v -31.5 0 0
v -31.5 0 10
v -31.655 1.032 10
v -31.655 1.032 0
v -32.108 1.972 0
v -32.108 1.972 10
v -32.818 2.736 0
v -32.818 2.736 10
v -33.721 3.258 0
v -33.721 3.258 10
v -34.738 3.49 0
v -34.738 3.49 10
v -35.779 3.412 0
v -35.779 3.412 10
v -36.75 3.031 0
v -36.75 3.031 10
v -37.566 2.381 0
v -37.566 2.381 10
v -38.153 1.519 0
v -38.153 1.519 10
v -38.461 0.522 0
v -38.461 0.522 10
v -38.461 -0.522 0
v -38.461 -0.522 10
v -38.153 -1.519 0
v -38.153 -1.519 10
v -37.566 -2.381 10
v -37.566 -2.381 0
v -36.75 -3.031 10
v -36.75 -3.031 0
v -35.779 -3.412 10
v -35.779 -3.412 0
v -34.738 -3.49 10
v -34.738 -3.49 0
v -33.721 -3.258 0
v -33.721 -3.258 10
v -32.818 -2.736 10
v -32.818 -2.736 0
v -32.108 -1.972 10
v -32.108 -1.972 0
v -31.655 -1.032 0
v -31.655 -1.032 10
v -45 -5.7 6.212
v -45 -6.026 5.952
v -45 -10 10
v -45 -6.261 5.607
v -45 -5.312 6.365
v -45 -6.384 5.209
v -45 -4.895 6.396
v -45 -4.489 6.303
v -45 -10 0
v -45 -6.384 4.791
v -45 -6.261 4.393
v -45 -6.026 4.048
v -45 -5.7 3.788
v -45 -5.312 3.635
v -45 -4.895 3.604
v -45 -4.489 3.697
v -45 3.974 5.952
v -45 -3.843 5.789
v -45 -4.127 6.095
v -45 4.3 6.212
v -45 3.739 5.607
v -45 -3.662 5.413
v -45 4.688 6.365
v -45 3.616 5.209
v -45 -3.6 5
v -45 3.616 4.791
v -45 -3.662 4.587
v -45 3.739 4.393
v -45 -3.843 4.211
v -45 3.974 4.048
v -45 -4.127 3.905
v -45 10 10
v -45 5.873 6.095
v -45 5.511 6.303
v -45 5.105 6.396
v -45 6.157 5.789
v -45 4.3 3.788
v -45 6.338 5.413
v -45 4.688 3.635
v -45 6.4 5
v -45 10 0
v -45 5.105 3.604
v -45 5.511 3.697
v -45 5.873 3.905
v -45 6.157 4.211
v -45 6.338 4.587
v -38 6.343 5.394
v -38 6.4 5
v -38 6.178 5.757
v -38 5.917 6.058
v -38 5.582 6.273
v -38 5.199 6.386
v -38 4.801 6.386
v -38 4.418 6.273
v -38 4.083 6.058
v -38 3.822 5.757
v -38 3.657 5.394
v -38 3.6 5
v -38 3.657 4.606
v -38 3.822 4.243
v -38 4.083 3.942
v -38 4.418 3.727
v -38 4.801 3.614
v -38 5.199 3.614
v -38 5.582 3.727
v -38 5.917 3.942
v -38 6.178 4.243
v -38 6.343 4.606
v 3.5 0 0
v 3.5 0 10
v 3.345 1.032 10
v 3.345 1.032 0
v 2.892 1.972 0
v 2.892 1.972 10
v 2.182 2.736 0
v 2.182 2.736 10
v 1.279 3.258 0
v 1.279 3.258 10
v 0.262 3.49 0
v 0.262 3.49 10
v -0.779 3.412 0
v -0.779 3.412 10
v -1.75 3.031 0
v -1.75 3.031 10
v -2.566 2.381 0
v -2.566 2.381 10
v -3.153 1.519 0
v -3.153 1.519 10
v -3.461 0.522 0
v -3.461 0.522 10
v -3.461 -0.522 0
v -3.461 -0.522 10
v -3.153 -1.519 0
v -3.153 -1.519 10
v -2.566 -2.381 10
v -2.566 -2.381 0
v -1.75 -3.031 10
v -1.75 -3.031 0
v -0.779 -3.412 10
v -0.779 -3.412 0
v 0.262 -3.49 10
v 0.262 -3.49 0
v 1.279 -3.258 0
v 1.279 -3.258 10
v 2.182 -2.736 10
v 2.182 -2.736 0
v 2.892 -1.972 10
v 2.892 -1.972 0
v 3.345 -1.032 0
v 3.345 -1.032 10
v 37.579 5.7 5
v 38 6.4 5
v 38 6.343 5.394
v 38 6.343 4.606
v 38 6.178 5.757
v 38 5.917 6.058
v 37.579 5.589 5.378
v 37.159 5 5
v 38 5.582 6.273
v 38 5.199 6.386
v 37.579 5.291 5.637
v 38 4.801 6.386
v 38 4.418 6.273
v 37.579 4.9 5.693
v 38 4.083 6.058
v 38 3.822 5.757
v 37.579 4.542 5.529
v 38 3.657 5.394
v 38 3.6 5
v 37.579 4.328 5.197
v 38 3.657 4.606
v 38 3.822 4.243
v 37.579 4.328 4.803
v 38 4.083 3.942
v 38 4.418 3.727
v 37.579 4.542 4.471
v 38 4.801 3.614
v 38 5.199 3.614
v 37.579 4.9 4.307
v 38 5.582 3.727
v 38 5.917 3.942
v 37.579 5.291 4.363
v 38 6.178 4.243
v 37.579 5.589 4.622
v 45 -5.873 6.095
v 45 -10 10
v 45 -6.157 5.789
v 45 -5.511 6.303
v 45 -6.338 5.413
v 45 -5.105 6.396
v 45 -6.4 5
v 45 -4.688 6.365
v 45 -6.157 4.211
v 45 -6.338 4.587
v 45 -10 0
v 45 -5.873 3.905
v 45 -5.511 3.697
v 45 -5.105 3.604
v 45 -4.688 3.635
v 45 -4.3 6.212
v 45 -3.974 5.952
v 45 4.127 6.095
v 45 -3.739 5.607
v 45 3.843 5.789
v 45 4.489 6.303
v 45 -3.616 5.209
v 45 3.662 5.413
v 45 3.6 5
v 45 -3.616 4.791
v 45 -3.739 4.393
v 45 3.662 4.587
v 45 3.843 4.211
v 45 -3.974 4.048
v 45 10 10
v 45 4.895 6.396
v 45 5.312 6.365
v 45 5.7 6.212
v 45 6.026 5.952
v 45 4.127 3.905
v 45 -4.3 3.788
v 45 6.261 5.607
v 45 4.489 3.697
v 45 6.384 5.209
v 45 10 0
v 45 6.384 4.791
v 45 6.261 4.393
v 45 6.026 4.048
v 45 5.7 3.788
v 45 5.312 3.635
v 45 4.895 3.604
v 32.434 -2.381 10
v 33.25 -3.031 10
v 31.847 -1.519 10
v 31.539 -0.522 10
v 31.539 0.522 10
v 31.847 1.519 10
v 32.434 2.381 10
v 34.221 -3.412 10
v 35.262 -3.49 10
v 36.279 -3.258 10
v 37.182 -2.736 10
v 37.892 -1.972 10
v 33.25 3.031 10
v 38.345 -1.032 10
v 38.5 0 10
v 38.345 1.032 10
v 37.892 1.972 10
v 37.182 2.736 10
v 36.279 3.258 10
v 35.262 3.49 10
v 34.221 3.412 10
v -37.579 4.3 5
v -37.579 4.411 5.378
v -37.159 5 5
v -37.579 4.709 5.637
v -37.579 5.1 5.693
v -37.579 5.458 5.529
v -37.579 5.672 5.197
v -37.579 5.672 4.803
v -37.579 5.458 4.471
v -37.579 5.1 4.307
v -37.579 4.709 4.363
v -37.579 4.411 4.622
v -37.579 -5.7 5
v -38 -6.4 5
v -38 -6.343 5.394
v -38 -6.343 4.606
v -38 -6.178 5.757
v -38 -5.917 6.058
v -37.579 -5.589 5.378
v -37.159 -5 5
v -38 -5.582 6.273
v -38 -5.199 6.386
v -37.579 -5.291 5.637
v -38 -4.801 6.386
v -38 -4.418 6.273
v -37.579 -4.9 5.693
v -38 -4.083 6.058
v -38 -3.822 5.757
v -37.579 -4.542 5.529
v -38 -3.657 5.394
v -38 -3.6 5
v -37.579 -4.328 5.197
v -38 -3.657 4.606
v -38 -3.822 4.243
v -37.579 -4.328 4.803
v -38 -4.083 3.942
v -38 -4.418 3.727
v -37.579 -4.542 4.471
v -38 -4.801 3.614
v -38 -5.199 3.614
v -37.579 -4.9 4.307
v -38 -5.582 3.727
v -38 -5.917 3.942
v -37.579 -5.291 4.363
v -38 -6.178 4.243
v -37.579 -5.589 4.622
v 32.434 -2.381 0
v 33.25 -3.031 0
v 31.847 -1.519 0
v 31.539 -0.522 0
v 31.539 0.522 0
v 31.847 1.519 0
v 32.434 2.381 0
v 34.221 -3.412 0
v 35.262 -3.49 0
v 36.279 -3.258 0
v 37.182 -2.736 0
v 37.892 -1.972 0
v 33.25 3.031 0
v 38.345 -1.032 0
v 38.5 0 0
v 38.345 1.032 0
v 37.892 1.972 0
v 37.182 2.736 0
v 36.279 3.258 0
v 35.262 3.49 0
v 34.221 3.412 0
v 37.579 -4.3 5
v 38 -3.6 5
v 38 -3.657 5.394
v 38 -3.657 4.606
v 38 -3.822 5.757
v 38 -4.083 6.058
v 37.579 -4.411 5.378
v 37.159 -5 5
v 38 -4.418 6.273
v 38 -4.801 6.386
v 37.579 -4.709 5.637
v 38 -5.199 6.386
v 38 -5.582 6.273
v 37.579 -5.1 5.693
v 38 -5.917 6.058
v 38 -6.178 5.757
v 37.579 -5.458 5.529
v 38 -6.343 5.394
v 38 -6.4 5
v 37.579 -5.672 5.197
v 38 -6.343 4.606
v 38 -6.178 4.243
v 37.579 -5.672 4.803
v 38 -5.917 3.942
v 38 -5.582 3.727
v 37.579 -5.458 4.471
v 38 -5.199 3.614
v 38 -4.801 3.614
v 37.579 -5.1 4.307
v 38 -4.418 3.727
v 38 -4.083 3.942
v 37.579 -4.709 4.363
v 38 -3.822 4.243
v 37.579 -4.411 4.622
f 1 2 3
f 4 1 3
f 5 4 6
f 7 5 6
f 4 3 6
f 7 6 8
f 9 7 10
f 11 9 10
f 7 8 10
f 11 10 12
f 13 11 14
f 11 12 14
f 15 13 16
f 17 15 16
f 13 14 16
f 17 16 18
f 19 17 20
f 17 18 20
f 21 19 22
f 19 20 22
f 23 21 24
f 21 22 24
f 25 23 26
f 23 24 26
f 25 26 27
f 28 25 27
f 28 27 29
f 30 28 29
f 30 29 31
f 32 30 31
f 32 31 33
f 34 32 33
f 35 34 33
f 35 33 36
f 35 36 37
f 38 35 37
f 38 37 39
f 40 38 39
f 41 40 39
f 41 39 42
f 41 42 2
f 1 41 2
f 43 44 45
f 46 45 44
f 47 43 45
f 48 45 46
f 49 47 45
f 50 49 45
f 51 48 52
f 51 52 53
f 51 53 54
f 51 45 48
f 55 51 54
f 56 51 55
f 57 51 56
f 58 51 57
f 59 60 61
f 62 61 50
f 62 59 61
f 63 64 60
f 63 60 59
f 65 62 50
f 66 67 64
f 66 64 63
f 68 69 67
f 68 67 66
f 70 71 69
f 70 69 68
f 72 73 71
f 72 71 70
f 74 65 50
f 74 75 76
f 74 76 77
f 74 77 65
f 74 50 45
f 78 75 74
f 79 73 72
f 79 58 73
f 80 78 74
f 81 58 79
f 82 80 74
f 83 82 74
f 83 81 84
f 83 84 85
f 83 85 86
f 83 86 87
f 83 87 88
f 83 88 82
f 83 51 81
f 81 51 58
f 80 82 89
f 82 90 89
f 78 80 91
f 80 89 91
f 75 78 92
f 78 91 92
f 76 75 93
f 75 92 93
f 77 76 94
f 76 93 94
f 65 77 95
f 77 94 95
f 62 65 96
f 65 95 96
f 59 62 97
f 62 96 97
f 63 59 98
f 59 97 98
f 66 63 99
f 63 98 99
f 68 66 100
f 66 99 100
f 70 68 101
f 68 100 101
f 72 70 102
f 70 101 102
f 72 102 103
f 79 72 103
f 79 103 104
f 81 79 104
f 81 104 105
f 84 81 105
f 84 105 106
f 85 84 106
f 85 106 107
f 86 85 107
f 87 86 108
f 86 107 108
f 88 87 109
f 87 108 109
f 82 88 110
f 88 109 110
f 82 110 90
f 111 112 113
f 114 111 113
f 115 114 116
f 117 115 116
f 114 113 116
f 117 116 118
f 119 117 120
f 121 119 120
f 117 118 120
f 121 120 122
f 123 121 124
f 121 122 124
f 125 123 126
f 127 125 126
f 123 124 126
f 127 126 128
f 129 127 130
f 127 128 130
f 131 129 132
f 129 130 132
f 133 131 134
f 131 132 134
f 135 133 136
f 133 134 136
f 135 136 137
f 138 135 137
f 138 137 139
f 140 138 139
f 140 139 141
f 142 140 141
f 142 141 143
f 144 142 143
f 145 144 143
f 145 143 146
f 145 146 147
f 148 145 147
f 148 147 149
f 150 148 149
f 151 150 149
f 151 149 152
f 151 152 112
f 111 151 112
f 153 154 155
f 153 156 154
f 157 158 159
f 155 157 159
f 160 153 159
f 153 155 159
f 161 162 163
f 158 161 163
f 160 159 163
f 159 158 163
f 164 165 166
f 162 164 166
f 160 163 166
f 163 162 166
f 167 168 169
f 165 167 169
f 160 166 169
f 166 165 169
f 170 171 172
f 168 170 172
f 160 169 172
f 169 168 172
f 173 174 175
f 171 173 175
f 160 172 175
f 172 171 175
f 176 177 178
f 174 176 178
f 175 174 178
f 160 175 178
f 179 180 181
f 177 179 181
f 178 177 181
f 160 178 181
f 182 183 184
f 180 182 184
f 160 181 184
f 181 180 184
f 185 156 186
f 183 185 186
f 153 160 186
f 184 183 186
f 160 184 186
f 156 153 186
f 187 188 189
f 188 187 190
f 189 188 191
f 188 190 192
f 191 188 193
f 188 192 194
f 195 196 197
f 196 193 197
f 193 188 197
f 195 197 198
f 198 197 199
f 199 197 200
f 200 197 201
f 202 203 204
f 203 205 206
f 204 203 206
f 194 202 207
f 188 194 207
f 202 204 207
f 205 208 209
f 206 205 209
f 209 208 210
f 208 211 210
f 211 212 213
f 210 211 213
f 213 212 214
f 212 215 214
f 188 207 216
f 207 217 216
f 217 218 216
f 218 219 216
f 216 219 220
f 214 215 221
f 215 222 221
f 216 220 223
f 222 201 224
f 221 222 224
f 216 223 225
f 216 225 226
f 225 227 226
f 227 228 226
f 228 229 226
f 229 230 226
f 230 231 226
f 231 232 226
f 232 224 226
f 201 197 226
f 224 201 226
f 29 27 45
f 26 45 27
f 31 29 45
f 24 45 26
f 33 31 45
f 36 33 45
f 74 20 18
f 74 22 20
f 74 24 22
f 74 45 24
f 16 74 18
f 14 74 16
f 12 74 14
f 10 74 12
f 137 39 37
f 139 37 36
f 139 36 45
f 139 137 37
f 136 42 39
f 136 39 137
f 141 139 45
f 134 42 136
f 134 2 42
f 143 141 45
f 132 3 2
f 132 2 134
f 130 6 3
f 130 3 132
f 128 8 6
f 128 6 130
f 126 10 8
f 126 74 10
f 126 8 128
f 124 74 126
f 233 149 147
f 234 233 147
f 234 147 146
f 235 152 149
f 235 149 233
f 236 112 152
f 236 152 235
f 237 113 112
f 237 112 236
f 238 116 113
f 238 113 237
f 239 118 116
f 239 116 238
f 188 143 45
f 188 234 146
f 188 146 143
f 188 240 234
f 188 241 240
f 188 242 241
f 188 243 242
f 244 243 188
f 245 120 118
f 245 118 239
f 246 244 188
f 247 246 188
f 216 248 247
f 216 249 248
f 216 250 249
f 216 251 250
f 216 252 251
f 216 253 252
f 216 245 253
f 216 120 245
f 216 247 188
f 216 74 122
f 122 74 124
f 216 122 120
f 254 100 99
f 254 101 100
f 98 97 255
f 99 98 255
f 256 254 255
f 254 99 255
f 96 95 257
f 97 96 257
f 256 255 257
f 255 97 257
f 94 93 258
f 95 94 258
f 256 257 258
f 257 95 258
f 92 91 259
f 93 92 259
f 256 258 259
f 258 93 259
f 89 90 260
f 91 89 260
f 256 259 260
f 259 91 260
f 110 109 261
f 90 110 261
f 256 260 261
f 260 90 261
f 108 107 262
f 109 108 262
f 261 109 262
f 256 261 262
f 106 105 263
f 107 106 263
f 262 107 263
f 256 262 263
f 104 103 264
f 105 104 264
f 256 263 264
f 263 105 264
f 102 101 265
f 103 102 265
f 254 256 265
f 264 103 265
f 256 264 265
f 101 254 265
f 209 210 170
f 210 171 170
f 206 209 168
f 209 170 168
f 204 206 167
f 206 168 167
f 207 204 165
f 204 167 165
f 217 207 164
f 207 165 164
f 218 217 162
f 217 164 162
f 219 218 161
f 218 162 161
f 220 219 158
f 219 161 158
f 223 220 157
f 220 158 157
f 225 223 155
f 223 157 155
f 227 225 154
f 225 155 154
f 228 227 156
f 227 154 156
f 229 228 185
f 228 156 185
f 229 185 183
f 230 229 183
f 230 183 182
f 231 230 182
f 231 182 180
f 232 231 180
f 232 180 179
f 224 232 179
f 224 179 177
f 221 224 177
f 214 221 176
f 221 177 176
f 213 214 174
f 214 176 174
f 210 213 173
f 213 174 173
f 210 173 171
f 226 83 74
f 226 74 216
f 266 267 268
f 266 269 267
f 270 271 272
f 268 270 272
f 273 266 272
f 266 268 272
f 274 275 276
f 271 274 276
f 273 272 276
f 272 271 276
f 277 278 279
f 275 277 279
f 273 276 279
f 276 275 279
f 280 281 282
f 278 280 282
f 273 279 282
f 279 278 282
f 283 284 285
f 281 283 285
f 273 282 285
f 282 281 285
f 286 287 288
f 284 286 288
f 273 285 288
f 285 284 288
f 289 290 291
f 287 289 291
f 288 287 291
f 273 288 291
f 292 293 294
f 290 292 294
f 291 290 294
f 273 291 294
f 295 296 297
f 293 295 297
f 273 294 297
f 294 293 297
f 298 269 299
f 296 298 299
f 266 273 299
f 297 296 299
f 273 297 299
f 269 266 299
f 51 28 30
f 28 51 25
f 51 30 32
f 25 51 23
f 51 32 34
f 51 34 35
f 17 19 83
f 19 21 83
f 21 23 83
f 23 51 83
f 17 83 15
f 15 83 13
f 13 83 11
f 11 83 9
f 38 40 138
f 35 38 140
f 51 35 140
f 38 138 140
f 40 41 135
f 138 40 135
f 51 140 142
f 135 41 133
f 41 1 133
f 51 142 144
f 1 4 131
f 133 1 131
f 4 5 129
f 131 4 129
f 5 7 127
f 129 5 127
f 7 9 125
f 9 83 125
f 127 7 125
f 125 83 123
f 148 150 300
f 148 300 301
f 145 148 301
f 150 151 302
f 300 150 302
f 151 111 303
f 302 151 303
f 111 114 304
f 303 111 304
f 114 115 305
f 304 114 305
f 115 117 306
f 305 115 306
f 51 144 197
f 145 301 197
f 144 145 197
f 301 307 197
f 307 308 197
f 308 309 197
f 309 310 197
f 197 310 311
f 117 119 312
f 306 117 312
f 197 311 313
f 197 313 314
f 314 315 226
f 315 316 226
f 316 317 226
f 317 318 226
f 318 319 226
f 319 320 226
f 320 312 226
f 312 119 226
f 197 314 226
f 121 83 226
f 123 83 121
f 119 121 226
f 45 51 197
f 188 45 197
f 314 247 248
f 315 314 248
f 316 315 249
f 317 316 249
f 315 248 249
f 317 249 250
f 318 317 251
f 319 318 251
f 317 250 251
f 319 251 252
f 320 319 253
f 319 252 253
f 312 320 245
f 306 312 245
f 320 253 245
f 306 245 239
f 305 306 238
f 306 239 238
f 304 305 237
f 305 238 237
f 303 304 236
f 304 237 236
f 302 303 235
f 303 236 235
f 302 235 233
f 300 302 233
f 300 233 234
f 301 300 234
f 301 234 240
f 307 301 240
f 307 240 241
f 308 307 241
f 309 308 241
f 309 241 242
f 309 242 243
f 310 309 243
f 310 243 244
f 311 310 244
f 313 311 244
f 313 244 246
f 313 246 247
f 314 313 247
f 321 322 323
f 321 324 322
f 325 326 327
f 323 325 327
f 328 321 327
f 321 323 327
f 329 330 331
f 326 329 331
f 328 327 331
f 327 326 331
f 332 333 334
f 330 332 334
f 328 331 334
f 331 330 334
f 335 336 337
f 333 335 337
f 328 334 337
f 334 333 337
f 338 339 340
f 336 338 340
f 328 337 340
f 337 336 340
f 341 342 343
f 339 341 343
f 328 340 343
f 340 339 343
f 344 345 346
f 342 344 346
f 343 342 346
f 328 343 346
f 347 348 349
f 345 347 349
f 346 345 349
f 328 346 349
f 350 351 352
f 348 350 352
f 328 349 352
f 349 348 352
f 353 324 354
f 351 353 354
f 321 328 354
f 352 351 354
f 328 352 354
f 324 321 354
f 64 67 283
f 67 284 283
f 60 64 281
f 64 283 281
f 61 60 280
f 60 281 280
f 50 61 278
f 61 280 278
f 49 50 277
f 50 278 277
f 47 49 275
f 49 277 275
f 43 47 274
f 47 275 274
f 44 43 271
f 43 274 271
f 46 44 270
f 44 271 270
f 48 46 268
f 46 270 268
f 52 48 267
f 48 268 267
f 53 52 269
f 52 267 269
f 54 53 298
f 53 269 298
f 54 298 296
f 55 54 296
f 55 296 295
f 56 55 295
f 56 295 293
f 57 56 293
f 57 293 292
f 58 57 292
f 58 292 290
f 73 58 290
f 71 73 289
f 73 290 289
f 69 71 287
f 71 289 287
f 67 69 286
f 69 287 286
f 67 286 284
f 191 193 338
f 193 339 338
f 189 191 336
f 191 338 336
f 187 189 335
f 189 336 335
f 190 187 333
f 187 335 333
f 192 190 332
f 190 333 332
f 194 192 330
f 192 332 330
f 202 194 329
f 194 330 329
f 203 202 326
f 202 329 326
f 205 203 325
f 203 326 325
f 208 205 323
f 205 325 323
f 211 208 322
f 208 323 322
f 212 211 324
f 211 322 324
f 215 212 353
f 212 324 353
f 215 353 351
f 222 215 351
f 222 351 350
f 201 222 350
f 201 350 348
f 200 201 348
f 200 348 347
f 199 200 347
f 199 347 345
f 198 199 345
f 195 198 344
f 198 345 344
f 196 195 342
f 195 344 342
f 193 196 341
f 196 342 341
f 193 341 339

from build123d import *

# Parameters (mm, degrees)
F0_W     = 90
F0_H     = 20
F1_DEPTH = 10
F3_D     = 2.8
F3_DEPTH = 7
F3_TIP   = 0.8412048666
F5_D     = 2.8
F5_DEPTH = 7
F5_TIP   = 0.8412048666
F6_R     = 3.5
F7_DEPTH = 25


with BuildPart() as f1:
    # F0 (on Top) → F1 (new body)
    with BuildSketch(Plane.XY):
        Rectangle(F0_W, F0_H)
    extrude(amount=F1_DEPTH)

    # F3
    with Locations(Plane(origin=(-45, 0, 0), x_dir=(0, -1, 0), z_dir=(-1, 0, 0))):
        with Locations((-5, 5), (5, 5)):
            Hole(F3_D / 2, depth=F3_DEPTH)
            with Locations((0, 0, -(F3_DEPTH + F3_TIP / 2))):  # 118° drill point
                Cone(0, F3_D / 2, F3_TIP, mode=Mode.SUBTRACT)

    # F5
    with Locations(Plane.YZ.offset(45)):
        with Locations((-5, 5), (5, 5)):
            Hole(F5_D / 2, depth=F5_DEPTH)
            with Locations((0, 0, -(F5_DEPTH + F5_TIP / 2))):  # 118° drill point
                Cone(0, F5_D / 2, F5_TIP, mode=Mode.SUBTRACT)

    # F6 (on face) → F7 (cut)
    with BuildSketch(Plane.XY.offset(10)):
        with Locations((35, 0)):
            Circle(F6_R)
        Circle(F6_R)
        with Locations((-35, 0)):
            Circle(F6_R)
    extrude(amount=-F7_DEPTH, mode=Mode.SUBTRACT)


solid = f1.part
